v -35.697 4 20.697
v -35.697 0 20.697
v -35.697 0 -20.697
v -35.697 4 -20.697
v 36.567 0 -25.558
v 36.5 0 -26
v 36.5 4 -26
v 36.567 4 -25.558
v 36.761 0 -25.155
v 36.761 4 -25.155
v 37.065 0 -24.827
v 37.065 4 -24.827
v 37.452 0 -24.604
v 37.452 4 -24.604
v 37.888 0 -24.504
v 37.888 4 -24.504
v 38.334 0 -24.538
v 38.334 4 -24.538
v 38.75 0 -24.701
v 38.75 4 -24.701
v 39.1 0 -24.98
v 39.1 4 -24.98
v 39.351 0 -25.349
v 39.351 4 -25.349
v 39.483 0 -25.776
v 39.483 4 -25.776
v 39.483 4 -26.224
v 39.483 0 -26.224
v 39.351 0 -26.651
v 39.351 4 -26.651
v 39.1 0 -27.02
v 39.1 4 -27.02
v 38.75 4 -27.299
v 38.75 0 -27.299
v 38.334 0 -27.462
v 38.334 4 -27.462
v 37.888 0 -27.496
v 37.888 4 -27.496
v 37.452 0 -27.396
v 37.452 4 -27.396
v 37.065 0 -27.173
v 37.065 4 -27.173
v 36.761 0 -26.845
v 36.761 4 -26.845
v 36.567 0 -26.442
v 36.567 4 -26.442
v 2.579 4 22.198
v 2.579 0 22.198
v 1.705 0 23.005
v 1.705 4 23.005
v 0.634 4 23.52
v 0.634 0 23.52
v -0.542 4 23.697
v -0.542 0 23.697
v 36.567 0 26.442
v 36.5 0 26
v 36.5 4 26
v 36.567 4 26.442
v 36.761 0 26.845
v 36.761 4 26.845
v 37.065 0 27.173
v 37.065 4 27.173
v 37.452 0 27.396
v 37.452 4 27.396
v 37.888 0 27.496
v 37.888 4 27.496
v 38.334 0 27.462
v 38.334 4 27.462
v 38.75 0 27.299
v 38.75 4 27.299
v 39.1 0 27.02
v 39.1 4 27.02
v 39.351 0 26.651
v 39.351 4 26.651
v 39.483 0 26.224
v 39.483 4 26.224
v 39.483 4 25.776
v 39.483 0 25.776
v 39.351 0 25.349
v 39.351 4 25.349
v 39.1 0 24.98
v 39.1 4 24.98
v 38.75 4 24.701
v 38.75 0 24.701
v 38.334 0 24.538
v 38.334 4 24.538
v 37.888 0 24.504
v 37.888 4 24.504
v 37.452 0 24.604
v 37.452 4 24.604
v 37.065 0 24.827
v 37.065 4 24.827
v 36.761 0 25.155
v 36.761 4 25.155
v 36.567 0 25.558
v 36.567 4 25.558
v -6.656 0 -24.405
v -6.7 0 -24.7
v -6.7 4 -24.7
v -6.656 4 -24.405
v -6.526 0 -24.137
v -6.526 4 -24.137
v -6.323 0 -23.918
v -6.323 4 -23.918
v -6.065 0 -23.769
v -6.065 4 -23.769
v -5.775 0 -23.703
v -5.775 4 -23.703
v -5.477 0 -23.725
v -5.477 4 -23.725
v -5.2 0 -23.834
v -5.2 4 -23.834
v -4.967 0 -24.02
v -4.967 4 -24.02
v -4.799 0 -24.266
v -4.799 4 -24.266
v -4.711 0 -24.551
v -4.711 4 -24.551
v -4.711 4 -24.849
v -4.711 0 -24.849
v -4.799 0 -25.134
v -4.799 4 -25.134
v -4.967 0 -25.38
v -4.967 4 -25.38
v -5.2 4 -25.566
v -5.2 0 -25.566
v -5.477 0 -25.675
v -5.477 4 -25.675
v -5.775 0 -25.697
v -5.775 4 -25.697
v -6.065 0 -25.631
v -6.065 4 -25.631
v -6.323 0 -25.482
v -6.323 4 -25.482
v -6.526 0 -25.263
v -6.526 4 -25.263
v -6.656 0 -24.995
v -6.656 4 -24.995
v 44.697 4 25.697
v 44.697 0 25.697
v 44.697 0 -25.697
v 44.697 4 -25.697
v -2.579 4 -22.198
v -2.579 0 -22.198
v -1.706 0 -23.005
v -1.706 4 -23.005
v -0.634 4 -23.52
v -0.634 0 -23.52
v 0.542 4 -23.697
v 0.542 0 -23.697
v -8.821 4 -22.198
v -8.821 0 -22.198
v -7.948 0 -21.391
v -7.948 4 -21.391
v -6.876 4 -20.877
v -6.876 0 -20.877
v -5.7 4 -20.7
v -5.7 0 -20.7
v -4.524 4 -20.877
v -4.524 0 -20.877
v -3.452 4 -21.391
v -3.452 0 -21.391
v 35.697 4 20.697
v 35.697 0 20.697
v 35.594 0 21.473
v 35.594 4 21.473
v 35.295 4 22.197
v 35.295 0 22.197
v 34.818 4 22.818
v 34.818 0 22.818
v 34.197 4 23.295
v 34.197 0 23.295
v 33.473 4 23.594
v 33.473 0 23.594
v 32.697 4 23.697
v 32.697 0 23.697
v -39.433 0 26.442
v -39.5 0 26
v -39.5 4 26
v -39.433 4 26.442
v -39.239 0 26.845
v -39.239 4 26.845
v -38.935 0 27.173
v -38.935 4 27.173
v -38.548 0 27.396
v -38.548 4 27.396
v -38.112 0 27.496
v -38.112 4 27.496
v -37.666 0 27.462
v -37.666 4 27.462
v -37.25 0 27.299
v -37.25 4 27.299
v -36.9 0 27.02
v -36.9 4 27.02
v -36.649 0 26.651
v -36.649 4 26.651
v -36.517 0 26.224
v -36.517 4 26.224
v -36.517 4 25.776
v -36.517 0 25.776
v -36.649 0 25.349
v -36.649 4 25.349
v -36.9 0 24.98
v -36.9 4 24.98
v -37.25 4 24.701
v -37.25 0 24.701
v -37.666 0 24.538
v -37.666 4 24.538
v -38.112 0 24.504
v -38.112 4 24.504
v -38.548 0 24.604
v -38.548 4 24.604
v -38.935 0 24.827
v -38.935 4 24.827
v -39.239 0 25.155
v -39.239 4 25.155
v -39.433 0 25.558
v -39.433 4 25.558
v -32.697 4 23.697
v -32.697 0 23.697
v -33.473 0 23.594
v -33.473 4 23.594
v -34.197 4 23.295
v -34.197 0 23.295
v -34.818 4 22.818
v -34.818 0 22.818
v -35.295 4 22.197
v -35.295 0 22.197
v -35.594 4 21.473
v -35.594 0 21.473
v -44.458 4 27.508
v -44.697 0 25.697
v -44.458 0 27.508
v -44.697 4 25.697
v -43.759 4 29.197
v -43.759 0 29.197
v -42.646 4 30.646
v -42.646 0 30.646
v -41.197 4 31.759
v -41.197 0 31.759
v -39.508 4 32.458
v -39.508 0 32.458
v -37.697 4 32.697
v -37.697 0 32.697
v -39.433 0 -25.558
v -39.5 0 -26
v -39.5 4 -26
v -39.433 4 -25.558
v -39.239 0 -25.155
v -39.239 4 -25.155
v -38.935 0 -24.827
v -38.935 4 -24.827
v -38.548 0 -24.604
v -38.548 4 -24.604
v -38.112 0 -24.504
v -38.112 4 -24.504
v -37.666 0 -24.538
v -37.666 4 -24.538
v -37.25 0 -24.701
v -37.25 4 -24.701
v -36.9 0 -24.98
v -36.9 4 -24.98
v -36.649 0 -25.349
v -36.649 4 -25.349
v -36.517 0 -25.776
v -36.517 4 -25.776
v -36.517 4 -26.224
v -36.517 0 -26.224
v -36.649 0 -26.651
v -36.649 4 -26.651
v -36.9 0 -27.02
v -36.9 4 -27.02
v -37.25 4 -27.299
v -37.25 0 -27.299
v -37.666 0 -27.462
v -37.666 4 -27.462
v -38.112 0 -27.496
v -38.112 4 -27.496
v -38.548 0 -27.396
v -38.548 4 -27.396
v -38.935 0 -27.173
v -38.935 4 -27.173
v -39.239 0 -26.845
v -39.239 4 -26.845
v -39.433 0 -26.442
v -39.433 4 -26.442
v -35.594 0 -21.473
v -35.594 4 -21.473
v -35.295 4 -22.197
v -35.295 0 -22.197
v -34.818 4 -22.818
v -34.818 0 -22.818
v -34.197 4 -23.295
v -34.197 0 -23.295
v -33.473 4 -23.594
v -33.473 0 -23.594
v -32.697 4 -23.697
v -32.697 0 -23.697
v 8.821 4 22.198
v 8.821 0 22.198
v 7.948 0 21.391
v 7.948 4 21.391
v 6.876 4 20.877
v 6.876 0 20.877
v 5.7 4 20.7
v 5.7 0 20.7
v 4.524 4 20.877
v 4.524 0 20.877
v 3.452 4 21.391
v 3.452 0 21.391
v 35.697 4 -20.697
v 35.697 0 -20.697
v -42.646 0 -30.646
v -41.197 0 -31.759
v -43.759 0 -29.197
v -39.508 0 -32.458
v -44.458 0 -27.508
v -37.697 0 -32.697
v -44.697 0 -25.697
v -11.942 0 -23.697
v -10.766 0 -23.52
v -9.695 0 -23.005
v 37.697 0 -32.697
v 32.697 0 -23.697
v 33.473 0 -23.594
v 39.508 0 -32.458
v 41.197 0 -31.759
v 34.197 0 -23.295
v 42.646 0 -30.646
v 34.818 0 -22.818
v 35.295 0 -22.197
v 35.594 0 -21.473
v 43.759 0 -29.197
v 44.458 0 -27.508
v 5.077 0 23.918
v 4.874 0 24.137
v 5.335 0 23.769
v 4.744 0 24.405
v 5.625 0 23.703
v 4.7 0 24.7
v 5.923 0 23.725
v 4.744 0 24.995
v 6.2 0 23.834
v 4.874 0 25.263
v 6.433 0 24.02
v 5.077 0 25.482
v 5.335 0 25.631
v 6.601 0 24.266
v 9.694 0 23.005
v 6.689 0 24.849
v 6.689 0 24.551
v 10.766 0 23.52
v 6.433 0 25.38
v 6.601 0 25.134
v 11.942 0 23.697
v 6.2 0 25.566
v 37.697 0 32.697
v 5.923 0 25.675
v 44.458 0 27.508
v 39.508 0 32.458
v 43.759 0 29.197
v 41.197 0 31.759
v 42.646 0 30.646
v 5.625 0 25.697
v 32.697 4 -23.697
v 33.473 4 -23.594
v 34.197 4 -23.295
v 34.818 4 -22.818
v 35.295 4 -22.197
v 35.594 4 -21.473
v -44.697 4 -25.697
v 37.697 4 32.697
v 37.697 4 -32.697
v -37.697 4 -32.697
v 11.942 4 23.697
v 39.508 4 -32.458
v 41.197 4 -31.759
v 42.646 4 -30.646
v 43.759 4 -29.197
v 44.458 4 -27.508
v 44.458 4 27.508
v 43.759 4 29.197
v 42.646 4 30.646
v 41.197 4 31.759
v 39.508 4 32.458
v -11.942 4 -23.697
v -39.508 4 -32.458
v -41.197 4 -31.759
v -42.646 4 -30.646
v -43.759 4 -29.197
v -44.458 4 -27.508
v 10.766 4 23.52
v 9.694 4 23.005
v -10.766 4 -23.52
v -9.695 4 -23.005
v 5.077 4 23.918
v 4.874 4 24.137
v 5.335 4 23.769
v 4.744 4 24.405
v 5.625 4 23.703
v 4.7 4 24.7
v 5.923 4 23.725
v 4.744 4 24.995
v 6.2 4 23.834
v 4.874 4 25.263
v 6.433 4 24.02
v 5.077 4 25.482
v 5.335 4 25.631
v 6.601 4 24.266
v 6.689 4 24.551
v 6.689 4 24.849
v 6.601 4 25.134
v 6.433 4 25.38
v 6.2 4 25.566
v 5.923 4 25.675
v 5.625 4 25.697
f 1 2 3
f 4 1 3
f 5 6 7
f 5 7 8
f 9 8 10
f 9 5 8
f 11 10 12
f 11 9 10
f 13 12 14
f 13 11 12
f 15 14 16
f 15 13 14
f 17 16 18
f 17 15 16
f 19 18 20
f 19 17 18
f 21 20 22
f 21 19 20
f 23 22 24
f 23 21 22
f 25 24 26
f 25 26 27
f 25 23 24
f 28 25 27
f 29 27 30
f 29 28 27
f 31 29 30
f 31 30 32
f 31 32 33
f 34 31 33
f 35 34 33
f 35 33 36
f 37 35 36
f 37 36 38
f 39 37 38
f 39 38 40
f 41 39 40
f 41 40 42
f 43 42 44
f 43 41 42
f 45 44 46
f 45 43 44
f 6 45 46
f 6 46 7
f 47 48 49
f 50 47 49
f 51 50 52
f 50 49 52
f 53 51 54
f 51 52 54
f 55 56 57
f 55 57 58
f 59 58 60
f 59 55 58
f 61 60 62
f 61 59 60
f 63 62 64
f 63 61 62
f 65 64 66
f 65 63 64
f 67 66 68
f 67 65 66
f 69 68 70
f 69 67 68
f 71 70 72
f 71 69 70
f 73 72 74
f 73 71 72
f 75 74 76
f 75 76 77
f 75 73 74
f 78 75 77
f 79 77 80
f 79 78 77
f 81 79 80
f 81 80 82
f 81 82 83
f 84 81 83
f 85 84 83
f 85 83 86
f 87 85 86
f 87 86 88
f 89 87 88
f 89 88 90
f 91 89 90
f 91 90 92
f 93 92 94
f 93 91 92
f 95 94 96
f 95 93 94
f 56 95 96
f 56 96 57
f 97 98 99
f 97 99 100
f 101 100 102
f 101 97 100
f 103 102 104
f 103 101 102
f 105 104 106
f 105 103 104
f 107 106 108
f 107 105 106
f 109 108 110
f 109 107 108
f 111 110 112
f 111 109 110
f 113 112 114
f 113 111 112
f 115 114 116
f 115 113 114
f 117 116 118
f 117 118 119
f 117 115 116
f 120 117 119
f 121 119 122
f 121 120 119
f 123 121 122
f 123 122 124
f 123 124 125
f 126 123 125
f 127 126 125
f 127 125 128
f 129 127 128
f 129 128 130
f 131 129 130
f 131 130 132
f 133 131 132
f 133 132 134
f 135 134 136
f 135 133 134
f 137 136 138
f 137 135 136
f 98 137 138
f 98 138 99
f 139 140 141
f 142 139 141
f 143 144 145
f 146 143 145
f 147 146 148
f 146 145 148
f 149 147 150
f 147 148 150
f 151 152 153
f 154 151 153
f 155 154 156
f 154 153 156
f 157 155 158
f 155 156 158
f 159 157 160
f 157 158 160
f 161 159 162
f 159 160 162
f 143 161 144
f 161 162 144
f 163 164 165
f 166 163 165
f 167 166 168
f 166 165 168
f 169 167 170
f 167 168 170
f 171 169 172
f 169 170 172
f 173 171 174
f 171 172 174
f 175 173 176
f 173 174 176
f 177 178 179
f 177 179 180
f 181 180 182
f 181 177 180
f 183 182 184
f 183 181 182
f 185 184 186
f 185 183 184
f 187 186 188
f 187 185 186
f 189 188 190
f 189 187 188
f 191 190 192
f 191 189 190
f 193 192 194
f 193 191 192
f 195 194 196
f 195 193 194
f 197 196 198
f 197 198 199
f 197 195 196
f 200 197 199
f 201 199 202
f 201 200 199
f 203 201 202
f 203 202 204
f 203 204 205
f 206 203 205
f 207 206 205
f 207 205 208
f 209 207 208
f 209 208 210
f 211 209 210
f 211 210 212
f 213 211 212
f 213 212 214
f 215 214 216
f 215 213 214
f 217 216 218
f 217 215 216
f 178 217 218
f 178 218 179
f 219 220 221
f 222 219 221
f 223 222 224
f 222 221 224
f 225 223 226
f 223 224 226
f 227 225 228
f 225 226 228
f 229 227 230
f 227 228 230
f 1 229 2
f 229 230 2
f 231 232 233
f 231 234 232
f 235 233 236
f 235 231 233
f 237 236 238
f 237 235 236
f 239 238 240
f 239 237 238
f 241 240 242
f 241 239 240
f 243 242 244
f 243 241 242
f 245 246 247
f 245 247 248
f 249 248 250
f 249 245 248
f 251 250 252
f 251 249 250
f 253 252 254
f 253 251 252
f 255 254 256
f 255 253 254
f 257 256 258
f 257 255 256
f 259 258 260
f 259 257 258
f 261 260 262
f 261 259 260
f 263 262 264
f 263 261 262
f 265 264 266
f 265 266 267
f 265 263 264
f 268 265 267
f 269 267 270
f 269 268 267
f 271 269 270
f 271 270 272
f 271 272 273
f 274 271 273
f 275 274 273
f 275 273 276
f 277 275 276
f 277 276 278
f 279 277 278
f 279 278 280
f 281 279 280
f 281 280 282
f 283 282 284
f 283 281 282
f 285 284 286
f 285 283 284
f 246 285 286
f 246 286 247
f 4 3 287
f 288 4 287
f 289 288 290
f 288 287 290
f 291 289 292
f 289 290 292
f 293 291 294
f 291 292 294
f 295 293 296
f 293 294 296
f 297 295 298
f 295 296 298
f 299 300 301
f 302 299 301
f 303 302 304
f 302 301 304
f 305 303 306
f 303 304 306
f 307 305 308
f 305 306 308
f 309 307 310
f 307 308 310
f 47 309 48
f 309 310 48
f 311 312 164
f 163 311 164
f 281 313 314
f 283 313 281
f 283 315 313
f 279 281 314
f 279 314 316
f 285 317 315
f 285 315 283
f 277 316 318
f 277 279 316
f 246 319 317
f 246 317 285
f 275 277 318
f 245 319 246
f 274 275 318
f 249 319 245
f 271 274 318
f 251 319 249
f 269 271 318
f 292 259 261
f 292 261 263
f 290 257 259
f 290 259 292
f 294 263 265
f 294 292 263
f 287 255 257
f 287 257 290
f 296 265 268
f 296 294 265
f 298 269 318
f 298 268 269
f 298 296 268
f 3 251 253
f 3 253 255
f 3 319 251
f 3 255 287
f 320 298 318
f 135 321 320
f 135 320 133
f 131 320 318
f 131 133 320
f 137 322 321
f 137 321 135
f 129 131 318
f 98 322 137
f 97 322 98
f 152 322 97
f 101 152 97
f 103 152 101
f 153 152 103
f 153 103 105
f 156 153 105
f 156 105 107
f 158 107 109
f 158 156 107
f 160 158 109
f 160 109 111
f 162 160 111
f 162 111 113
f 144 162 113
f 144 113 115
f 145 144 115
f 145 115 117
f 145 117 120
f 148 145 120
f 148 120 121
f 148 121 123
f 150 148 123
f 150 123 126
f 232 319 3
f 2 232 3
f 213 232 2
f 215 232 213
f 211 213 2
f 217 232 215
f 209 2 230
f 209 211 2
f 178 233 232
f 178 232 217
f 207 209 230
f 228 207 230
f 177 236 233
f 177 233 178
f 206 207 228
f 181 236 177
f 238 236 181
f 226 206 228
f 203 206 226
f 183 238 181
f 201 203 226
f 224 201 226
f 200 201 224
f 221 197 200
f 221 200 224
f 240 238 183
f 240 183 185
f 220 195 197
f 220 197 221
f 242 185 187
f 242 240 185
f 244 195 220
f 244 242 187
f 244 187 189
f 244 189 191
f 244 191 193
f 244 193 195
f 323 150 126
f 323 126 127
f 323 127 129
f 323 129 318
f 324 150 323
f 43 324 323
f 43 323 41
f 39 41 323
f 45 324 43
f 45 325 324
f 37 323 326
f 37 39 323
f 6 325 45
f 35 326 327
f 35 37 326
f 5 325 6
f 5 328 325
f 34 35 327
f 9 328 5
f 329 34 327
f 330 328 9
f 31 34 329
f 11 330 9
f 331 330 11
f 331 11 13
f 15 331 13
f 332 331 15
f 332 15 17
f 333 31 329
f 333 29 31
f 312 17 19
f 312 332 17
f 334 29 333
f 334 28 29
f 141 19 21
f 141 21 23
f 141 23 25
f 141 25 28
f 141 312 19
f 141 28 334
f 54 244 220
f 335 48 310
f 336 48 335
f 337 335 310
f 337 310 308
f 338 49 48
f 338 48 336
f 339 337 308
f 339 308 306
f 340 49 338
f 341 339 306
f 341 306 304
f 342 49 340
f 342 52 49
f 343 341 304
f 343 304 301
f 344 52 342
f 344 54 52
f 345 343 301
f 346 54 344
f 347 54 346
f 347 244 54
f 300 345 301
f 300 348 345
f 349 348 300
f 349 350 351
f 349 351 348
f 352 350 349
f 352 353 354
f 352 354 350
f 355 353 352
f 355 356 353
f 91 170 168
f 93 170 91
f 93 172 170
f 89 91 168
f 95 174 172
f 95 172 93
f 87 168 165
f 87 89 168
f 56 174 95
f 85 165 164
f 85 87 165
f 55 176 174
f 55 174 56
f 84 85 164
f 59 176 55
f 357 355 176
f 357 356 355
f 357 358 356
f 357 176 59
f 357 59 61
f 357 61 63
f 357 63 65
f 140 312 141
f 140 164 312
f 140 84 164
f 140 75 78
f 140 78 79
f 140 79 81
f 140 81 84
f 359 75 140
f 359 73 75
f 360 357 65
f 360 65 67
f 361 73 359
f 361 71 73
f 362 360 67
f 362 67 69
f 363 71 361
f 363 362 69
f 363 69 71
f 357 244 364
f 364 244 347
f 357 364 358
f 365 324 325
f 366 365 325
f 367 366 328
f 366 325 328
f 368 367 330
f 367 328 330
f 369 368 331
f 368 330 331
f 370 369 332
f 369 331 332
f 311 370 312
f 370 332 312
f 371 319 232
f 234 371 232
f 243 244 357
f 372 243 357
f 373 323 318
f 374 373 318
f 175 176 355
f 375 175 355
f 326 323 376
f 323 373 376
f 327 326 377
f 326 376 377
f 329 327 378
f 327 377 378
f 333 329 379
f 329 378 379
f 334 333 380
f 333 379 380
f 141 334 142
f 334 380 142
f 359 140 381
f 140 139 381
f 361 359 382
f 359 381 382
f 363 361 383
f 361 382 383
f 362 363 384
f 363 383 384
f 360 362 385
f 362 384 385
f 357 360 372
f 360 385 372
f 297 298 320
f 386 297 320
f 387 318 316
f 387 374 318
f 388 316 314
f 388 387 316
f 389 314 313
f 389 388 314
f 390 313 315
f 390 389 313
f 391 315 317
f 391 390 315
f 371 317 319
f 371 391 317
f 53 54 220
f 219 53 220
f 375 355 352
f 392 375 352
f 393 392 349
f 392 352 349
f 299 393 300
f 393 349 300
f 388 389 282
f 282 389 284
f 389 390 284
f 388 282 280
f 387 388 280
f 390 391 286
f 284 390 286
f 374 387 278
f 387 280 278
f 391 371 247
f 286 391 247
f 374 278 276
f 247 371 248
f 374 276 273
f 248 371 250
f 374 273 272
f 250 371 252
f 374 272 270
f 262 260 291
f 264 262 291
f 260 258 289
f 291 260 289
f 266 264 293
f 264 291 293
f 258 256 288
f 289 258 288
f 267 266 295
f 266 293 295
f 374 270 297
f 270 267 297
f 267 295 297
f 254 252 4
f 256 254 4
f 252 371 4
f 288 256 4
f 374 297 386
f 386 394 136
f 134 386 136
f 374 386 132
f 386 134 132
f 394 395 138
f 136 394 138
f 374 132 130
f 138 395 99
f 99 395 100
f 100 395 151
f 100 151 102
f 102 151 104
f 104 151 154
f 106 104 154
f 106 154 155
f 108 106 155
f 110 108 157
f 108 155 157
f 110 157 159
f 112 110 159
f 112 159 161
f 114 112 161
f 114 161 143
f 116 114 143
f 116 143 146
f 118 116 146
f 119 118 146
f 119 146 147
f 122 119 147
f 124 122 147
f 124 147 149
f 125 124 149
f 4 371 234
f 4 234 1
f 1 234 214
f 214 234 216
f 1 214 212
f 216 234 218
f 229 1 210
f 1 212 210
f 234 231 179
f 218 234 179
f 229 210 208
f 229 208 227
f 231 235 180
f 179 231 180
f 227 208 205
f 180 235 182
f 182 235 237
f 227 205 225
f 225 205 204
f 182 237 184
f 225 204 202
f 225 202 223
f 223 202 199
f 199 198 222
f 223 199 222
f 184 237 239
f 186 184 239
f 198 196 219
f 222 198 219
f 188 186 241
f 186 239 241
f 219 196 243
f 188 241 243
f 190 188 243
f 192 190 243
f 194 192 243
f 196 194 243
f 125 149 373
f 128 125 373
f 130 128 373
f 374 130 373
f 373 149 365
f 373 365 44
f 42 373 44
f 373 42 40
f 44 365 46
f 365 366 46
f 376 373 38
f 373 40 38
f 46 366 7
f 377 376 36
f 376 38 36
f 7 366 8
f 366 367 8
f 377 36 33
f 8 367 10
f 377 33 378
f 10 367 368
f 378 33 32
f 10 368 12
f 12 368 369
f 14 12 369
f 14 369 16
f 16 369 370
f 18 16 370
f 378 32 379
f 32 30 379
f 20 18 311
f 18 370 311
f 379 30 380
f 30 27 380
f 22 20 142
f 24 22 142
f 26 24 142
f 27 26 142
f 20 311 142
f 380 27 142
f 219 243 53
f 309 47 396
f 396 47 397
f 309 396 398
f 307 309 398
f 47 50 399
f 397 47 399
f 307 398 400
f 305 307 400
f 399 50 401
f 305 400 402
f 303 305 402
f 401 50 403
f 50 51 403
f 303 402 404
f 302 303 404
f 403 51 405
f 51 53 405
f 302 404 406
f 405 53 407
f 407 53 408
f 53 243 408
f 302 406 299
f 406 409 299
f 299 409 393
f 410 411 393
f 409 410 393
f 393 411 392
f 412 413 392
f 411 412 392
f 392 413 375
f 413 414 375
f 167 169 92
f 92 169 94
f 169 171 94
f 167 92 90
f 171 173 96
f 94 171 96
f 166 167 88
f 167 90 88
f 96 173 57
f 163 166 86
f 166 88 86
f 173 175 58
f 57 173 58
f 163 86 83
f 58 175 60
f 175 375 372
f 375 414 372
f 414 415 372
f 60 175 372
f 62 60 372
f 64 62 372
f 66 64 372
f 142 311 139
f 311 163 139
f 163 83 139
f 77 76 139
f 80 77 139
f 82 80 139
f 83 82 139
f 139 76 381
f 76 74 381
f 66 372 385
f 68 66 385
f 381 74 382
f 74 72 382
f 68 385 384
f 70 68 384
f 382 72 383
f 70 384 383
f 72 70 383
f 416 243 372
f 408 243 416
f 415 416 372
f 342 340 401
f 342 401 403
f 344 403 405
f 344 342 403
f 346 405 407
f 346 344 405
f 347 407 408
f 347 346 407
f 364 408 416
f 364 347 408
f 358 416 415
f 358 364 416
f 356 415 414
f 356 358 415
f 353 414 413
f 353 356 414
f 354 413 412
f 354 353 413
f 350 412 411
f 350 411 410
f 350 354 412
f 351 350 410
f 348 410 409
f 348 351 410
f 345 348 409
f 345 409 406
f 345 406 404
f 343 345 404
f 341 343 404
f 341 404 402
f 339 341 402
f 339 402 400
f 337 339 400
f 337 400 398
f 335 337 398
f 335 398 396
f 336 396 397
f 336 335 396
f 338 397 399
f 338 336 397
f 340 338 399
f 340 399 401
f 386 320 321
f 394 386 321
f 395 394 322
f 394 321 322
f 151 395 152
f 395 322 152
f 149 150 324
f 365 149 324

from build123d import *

# Parameters (mm, degrees)
SKETCH_2_R      = 1.5
SKETCH_2_R_2    = 1
EXTRUDE_1_DEPTH = 4
FILLET_1_R      = 7


with BuildPart() as part:
    # 草圖2 → 填料-伸長1 (new body)
    with BuildSketch(Plane(origin=(0, 0, 0), x_dir=(-1, 0, 0), z_dir=(0, 1, 0))):
        Polygon((32.696699141, -32.696699141), (-32.696699141, -32.696699141), (-44.696699141, -32.696699141), (-44.696699141, -20.696699141), (-44.696699141, 20.696699141), (-44.696699141, 32.696699141), (-32.696699141, 32.696699141), (32.696699141, 32.696699141), (44.696699141, 32.696699141), (44.696699141, 20.696699141), (44.696699141, -20.696699141), (44.696699141, -32.696699141), align=None)
        with Locations((38, 26)):
            Circle(SKETCH_2_R, mode=Mode.SUBTRACT)
        with Locations((38, -26)):
            Circle(SKETCH_2_R, mode=Mode.SUBTRACT)
        with Locations((-38, 26)):
            Circle(SKETCH_2_R, mode=Mode.SUBTRACT)
        with Locations((-38, -26)):
            Circle(SKETCH_2_R, mode=Mode.SUBTRACT)
        with Locations((5.700000775, -24.699999821)):
            Circle(SKETCH_2_R_2, mode=Mode.SUBTRACT)
        with Locations((-5.699999225, 24.700000179)):
            Circle(SKETCH_2_R_2, mode=Mode.SUBTRACT)
        with BuildLine():
            Line((32.696699141, -23.696699141), (11.942354682, -23.696699141))
            ThreePointArc((11.942354682, -23.696699141), (10.211256961, -23.302708109), (8.821177729, -22.198349481))
            ThreePointArc((8.821177729, -22.198349481), (5.700000775, -20.699999821), (2.578823821, -22.198349481))
            ThreePointArc((2.578823821, -22.198349481), (1.188744589, -23.302708109), (-0.542353133, -23.696699141))
            Line((-0.542353133, -23.696699141), (-32.696699141, -23.696699141))
            ThreePointArc((-32.696699141, -23.696699141), (-34.818019485, -22.818019485), (-35.696699141, -20.696699141))
            Line((-35.696699141, -20.696699141), (-35.696699141, 20.696699141))
            ThreePointArc((-35.696699141, 20.696699141), (-34.818019485, 22.818019485), (-32.696699141, 23.696699141))
            Line((-32.696699141, 23.696699141), (-11.942352846, 23.696699141))
            ThreePointArc((-11.942352846, 23.696699141), (-10.211255228, 23.302708159), (-8.821176036, 22.19834966))
            ThreePointArc((-8.821176036, 22.19834966), (-5.699999225, 20.700000179), (-2.578822415, 22.19834966))
            ThreePointArc((-2.578822415, 22.19834966), (-1.188743222, 23.302708159), (0.542354396, 23.696699141))
            Line((0.542354396, 23.696699141), (32.696699141, 23.696699141))
            ThreePointArc((32.696699141, 23.696699141), (34.818019485, 22.818019485), (35.696699141, 20.696699141))
            Line((35.696699141, 20.696699141), (35.696699141, -20.696699141))
            ThreePointArc((35.696699141, -20.696699141), (34.818019485, -22.818019485), (32.696699141, -23.696699141))
        make_face(mode=Mode.SUBTRACT)
    extrude(amount=EXTRUDE_1_DEPTH)

    # 圓角1
    fillet_1_edges = [part.edges().sort_by_distance(p)[0] for p in [
        (44.696699141, 2, -32.696699141),
        (44.696699141, 2, 32.696699141),
        (-44.696699141, 2, 32.696699141),
        (-44.696699141, 2, -32.696699141),
    ]]
    fillet(fillet_1_edges, radius=FILLET_1_R)


solid = part.part
